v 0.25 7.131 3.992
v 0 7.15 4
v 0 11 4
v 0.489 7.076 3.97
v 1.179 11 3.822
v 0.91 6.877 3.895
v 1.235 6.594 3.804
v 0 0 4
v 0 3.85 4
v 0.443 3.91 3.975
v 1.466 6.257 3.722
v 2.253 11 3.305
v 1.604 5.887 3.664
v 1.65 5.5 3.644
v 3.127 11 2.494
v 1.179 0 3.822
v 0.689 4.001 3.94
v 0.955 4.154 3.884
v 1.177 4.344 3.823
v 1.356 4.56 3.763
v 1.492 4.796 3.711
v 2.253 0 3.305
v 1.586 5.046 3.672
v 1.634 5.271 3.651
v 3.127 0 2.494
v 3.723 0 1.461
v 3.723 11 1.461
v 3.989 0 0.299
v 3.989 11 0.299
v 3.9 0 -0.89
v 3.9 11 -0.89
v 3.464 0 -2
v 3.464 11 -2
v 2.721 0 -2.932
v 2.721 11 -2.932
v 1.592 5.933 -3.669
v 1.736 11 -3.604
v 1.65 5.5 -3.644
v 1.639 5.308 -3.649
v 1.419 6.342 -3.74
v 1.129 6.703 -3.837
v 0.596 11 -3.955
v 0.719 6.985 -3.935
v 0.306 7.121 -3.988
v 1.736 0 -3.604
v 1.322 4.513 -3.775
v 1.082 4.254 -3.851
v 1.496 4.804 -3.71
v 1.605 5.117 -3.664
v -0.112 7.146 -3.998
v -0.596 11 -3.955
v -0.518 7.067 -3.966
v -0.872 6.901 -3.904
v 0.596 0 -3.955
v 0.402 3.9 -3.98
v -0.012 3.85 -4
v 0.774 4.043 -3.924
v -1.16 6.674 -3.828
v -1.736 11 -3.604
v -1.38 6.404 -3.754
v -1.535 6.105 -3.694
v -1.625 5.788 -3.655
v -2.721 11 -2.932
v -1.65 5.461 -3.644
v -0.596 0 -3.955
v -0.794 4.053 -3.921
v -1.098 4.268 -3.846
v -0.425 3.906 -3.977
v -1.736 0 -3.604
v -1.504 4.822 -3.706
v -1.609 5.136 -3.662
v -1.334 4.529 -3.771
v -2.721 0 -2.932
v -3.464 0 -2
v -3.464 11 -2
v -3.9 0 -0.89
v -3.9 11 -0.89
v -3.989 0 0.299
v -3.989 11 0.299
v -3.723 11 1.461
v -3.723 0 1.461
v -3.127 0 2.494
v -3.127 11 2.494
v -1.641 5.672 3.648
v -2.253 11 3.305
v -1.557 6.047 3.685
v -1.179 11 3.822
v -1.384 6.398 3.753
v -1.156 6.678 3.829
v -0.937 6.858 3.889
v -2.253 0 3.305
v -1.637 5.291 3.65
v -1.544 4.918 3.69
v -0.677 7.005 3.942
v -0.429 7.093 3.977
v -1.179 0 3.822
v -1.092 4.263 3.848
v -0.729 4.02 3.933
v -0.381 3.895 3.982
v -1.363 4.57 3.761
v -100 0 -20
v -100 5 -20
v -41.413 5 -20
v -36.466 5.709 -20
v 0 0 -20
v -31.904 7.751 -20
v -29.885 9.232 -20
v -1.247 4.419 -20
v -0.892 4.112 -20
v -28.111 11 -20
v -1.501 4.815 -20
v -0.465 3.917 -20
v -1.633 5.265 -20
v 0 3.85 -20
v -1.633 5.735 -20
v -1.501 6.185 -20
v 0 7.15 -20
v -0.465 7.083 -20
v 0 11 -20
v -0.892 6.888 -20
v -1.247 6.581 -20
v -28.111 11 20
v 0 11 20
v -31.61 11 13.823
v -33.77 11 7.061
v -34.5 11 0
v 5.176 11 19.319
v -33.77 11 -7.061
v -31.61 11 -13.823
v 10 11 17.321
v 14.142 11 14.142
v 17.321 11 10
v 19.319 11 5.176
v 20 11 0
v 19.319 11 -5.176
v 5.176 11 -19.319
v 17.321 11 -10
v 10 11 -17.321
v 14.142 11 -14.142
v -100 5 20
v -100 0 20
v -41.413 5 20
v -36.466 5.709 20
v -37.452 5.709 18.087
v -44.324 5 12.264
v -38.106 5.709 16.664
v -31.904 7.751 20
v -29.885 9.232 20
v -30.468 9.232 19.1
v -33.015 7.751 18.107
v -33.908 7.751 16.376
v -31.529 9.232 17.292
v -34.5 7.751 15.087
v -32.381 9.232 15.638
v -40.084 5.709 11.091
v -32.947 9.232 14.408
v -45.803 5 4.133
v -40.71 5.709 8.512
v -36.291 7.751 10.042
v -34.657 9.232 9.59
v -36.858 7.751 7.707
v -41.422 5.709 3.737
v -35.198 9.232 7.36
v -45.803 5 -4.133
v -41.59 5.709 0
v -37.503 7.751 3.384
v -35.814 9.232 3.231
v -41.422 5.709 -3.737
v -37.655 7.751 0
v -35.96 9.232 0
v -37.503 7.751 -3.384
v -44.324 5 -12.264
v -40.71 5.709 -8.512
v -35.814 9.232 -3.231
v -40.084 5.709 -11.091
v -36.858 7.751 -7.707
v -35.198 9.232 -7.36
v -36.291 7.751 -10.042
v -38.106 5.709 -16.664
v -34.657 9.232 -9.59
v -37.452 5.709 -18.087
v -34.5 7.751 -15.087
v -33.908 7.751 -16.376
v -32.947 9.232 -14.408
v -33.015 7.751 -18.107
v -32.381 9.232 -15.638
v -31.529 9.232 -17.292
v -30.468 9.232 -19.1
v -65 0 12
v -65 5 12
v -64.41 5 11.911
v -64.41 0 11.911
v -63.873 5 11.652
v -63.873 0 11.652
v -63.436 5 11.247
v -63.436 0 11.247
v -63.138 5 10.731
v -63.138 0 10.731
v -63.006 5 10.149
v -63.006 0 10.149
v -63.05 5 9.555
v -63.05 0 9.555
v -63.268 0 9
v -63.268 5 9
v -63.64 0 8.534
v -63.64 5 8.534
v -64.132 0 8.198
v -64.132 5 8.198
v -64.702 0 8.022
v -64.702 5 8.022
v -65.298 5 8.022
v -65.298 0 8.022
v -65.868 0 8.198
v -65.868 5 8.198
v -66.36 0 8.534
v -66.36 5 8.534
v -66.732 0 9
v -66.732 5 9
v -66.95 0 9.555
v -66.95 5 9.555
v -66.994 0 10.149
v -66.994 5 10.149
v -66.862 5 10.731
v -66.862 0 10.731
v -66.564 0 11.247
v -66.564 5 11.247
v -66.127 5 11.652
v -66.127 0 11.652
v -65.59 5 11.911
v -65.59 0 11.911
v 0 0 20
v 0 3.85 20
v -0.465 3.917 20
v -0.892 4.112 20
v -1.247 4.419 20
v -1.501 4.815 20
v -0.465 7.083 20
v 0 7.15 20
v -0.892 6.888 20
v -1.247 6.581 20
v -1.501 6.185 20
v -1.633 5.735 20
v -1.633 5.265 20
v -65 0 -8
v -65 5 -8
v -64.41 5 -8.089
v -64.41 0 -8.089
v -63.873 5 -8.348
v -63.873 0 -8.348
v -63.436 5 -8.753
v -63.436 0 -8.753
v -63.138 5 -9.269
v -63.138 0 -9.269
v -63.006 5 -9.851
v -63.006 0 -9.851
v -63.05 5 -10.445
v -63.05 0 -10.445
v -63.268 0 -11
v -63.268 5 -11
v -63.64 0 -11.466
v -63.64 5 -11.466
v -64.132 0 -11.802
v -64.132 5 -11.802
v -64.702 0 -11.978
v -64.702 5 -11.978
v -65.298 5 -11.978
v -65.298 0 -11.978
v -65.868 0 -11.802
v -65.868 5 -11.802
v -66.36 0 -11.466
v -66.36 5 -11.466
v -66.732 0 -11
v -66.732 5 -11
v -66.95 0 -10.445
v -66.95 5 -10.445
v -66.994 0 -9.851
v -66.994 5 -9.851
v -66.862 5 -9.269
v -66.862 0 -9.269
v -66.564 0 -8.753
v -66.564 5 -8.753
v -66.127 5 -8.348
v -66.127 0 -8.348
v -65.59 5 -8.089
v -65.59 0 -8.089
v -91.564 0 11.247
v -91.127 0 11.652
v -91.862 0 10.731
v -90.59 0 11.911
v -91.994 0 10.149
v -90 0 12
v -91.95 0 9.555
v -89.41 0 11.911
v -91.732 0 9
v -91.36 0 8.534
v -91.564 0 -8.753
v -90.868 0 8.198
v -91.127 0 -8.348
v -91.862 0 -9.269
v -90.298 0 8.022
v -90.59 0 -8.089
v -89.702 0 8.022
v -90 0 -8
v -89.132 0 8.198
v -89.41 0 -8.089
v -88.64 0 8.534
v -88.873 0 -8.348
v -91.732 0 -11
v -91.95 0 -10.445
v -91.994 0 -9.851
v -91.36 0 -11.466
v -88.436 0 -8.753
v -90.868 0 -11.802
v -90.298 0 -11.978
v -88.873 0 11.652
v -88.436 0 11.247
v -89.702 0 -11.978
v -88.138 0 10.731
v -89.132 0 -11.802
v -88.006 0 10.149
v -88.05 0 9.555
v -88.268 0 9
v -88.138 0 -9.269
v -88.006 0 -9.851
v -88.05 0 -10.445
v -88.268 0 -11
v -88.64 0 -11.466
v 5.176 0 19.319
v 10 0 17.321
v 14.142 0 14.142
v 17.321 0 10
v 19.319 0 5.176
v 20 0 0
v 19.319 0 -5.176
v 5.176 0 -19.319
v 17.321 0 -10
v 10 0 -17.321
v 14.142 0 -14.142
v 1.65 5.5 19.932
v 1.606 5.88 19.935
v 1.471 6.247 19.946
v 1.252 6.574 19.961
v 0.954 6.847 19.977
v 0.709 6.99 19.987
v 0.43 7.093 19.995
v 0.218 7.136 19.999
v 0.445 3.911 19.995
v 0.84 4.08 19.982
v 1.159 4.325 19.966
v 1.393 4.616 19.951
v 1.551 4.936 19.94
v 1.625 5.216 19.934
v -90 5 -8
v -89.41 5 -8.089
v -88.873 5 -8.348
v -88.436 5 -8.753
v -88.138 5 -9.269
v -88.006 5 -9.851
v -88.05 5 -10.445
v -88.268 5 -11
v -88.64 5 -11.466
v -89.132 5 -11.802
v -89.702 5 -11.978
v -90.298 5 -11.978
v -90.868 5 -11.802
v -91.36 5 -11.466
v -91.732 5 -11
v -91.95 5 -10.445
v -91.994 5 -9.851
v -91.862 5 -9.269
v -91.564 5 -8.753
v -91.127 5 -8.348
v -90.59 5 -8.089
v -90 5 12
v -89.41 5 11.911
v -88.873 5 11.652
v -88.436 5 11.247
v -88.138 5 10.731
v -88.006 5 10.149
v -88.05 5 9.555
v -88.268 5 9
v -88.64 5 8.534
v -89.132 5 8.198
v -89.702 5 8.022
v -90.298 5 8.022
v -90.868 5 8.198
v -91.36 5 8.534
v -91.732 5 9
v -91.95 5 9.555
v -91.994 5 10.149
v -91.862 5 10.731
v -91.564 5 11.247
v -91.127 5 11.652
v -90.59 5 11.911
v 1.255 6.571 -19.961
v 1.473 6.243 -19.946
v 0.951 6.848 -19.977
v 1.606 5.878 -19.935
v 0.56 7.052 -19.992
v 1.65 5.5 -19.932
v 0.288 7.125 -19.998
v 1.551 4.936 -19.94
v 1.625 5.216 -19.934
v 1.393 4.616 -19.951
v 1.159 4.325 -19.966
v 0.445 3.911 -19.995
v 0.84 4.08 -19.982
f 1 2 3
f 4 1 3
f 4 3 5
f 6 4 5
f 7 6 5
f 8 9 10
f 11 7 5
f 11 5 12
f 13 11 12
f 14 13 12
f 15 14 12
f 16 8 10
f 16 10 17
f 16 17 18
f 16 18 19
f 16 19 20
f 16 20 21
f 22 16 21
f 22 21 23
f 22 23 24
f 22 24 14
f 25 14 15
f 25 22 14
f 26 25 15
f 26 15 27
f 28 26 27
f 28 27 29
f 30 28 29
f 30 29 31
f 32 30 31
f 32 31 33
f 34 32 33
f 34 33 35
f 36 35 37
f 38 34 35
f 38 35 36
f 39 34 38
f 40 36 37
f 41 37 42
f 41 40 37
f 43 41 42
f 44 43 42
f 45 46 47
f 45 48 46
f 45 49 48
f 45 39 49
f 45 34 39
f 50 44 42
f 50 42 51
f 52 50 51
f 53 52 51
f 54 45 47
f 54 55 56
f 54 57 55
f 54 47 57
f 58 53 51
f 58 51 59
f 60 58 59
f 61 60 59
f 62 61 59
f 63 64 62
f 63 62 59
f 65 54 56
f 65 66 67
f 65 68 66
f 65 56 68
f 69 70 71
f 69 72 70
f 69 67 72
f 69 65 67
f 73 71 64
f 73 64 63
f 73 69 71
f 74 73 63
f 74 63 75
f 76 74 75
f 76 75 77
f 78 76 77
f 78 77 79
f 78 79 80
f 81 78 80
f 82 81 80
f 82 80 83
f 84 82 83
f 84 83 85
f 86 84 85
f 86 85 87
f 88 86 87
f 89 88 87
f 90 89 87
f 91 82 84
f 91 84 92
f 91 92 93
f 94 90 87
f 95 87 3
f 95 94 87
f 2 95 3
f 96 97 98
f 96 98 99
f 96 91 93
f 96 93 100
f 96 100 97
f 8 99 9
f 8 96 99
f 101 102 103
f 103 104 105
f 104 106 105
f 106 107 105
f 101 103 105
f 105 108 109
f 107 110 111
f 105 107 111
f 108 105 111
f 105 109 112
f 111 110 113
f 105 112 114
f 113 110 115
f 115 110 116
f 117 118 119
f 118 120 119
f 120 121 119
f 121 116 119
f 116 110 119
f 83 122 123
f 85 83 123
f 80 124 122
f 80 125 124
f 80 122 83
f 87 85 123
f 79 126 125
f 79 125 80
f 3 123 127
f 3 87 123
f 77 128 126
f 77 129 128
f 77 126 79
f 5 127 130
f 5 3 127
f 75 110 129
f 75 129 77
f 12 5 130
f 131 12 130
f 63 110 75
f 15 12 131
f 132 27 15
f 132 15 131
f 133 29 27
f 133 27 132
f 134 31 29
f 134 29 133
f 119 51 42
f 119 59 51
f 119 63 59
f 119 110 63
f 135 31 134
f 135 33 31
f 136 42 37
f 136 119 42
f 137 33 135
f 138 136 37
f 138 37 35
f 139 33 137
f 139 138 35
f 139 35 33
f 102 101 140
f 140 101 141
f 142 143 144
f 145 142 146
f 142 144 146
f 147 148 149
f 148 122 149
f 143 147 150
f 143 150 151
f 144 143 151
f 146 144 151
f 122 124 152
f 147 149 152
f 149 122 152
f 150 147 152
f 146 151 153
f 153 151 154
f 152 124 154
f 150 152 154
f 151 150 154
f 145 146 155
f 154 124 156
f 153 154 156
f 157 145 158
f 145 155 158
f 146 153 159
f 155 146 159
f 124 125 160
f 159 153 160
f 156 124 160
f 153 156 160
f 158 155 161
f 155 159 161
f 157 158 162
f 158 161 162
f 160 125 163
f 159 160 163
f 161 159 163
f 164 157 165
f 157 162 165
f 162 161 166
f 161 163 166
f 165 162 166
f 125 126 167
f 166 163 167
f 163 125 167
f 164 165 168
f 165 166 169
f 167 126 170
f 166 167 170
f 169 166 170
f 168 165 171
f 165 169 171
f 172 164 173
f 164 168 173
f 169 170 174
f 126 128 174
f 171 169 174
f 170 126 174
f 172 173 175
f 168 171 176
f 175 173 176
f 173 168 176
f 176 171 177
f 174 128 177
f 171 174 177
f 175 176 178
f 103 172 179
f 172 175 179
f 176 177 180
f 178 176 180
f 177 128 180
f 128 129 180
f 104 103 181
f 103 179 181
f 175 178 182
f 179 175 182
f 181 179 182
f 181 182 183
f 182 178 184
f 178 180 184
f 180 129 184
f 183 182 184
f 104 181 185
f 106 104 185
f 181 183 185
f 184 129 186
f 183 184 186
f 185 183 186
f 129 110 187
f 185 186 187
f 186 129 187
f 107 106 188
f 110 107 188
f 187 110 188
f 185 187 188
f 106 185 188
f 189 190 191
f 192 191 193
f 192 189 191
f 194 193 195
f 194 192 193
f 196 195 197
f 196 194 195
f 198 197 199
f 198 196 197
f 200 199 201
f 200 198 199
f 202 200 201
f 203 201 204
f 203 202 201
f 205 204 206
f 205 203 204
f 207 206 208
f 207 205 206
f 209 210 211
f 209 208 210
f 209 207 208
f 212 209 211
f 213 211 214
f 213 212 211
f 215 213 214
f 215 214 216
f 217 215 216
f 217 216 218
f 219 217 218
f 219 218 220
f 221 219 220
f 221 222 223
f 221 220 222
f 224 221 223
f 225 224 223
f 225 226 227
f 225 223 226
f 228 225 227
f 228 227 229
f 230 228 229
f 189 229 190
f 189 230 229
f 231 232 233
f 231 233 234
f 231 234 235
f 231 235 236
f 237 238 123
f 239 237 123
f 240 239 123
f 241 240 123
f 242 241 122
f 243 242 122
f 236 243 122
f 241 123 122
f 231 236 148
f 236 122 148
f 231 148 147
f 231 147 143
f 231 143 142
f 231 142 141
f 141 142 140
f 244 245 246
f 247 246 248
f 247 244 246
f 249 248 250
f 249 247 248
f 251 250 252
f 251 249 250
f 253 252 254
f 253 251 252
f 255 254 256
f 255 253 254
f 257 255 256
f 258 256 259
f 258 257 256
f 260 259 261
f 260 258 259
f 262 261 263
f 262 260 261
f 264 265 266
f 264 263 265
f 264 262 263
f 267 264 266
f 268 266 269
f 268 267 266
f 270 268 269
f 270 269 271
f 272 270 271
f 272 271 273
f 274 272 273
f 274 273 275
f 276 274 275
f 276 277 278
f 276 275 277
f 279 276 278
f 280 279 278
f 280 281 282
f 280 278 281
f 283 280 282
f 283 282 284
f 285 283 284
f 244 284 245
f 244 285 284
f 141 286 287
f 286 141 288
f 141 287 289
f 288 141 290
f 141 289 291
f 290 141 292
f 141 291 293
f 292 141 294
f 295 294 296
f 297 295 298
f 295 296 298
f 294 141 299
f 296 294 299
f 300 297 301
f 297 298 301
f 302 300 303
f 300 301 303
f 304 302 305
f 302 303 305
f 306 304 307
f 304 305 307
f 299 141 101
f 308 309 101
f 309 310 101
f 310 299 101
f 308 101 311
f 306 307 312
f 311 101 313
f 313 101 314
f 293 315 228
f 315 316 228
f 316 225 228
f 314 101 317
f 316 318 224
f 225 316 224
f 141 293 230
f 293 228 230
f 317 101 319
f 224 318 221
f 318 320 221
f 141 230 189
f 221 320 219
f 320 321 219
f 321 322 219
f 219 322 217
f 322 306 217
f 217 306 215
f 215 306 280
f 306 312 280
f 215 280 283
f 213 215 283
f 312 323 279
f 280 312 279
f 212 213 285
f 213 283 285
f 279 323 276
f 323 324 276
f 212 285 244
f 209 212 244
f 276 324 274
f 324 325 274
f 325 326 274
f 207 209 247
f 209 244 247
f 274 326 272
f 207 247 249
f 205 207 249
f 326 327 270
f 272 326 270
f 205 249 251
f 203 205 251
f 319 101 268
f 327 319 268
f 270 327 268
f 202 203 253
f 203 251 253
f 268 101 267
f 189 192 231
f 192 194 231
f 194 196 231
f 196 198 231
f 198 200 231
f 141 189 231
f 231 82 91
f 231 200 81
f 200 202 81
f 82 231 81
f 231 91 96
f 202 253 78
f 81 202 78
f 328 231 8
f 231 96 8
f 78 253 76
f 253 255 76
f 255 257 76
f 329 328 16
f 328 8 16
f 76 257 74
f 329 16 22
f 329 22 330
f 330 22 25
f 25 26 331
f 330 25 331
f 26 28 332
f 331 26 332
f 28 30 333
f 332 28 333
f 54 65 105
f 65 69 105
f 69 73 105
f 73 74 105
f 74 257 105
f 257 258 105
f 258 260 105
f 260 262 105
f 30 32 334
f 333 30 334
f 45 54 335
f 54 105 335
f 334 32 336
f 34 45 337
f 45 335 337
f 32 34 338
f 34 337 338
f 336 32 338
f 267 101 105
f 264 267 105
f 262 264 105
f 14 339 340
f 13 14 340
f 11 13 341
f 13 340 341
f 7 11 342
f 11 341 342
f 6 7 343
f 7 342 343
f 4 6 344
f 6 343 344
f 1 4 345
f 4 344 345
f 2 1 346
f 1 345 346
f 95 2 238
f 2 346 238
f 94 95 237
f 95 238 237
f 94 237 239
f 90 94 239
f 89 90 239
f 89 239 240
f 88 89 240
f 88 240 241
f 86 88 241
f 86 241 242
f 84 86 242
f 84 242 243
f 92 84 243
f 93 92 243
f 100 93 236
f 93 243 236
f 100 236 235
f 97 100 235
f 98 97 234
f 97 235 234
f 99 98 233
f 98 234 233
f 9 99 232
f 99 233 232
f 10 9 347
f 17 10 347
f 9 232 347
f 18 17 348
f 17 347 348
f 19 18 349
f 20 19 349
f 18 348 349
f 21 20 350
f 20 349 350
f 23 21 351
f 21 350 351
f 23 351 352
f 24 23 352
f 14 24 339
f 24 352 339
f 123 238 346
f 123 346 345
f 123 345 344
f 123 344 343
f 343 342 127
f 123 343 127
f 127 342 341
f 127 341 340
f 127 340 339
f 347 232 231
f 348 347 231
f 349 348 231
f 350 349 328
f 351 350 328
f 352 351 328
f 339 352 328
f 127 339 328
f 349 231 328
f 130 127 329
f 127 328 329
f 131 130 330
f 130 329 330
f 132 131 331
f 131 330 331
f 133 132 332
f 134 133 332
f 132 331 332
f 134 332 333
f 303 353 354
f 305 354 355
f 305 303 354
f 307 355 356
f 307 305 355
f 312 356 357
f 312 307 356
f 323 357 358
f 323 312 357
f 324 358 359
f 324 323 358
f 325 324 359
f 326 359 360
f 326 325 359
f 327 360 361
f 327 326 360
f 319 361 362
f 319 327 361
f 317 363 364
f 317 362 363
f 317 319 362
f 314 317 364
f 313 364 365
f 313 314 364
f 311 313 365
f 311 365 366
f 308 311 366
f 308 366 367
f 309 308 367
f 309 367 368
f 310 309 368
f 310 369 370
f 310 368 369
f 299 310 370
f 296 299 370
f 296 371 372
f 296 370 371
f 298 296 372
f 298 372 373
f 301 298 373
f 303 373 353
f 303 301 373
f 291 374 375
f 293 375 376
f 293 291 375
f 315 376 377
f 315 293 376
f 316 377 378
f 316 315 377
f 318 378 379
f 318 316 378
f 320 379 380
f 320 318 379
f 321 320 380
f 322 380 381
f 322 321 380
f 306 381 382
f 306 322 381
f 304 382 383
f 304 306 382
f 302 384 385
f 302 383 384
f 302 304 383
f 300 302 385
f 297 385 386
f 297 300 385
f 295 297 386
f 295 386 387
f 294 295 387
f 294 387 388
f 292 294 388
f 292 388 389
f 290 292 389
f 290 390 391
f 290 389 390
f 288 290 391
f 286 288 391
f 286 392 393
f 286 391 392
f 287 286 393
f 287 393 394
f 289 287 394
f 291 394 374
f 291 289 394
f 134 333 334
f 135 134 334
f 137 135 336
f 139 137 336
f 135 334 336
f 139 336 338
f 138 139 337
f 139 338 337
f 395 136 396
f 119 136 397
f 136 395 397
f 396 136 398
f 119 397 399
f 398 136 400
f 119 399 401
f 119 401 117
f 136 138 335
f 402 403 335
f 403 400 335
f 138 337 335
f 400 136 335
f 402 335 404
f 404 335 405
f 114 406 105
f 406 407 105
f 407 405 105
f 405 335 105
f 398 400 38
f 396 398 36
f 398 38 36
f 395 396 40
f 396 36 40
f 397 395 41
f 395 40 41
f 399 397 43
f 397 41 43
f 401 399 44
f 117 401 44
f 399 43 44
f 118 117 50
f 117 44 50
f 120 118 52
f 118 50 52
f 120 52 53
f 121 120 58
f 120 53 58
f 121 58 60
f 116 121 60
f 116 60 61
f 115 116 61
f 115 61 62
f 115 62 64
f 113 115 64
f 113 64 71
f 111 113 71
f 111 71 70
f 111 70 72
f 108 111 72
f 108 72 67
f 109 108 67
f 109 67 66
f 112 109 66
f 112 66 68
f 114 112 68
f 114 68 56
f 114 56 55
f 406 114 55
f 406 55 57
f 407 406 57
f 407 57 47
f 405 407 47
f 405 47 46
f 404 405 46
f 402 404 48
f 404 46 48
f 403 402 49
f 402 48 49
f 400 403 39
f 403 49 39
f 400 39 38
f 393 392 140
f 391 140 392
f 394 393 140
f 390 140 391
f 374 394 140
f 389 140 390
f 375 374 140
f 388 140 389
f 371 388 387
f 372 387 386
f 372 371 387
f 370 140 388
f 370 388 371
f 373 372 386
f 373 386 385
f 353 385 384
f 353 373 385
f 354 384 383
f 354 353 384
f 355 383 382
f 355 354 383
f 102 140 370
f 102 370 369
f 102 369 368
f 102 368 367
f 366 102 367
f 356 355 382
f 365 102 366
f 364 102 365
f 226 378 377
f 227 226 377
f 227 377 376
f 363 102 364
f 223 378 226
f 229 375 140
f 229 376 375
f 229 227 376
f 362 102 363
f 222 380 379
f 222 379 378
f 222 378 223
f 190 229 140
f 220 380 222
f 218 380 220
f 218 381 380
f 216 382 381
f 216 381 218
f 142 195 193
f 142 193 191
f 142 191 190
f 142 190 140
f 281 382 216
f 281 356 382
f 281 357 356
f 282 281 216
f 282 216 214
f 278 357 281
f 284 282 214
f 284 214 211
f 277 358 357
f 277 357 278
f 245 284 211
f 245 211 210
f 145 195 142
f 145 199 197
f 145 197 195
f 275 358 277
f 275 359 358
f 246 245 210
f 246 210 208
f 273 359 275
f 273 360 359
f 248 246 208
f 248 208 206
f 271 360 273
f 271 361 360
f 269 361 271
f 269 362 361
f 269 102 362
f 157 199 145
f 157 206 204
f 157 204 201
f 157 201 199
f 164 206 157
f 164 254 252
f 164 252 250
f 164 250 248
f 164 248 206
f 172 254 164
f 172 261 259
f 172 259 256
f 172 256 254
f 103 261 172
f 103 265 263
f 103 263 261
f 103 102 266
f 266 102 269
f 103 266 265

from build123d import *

# Parameters (mm, degrees)
SKETCH1_R           = 2
SKETCH1_R_2         = 4
BOSS_EXTRUDE1_DEPTH = 11
CUT_EXTRUDE1_DEPTH  = 6
FILLET2_R           = 14
M4_TAPPED_HOLE1_D   = 3.3


with BuildPart() as part:
    # Sketch1 → Boss-Extrude1 (new body)
    with BuildSketch(Plane(origin=(0, 0, 0), x_dir=(1, 0, 0), z_dir=(0, 1, 0))):
        with BuildLine():
            Line((0, 20), (-100, 20))
            Line((-100, 20), (-100, -5))
            Line((-100, -5), (-100, -20))
            Line((-100, -20), (0, -20))
            ThreePointArc((0, -20), (14.142135607, -14.14213564), (20, -4.7e-08))
            ThreePointArc((20, -4.7e-08), (14.14213564, 14.142135607), (0, 20))
        make_face()
        with Locations(Location((-90, -10, 0), (0, 0, 270))):
            Circle(SKETCH1_R, mode=Mode.SUBTRACT)
        with Locations(Location((-65, -10, 0), (0, 0, 270))):
            Circle(SKETCH1_R, mode=Mode.SUBTRACT)
        with Locations(Location((-90, 10, 0), (0, 0, 270))):
            Circle(SKETCH1_R, mode=Mode.SUBTRACT)
        with Locations(Location((-65, 10, 0), (0, 0, 270))):
            Circle(SKETCH1_R, mode=Mode.SUBTRACT)
        with Locations(Location((0, 0, 0), (0, 0, 270))):
            Circle(SKETCH1_R_2, mode=Mode.SUBTRACT)
    extrude(amount=BOSS_EXTRUDE1_DEPTH)

    # Sketch4 → Cut-Extrude1 (cut)
    with BuildSketch(Plane(origin=(0, 11, 0), x_dir=(1, 0, 0), z_dir=(0, 1, 0))):
        with BuildLine():
            Line((-28.111385594, 20), (-100, 20))
            Line((-100, 20), (-100, -20))
            Line((-100, -20), (-28.111385594, -20))
            ThreePointArc((-28.111385594, -20), (-34.5, 0), (-28.111385594, 20))
        make_face()
    extrude(amount=-CUT_EXTRUDE1_DEPTH, mode=Mode.SUBTRACT)

    # Fillet2
    # the kernel refuses this fillet: 14 mm, written as the material it adds along each edge
    with BuildSketch(Plane(origin=(0, 5, 0), x_dir=(-0.1193853688936188, 0, 0.9928479912323611), z_dir=(0.9928479912323611, 0, 0.1193853688936188))) as fillet2_piece_1_section:
        with BuildLine():
            CenterArc((45.989125293, -14), FILLET2_R, 90, 55.150095421)
            Line((34.5, -6), (34.270217494, -5.84))
            ThreePointArc((34.270217494, -5.84), (34.22, -3), (34.22, 0))
            Line((34.22, 0), (34.5, 0.28))
            Line((34.5, 0.28), (45.989125293, 0.28))
            Line((45.989125293, 0.28), (45.989125293, 0))
        make_face()
    fillet2_piece_1 = revolve(axis=Axis((0, 5, 0), (0, -1, 0)), revolution_arc=166.286736379, mode=Mode.PRIVATE)
    fillet2_piece_1 = split(fillet2_piece_1, bisect_by=Plane(origin=(-35.442796837, 6.550585525, -20), z_dir=(0, 0, 1)), keep=Keep.TOP, mode=Mode.PRIVATE)
    fillet2_piece_1 = split(fillet2_piece_1, bisect_by=Plane(origin=(-35.442796837, 6.550585525, 20), z_dir=(0, 0, -1)), keep=Keep.TOP, mode=Mode.PRIVATE)
    add(fillet2_piece_1)

    # M4 Tapped Hole1 (through all)
    with Locations(Plane(origin=(0, 0, -20), x_dir=(-1, 0, 0), z_dir=(0, 0, -1))):
        with Locations((0, 5.5)):
            Hole(M4_TAPPED_HOLE1_D / 2)


solid = part.part
